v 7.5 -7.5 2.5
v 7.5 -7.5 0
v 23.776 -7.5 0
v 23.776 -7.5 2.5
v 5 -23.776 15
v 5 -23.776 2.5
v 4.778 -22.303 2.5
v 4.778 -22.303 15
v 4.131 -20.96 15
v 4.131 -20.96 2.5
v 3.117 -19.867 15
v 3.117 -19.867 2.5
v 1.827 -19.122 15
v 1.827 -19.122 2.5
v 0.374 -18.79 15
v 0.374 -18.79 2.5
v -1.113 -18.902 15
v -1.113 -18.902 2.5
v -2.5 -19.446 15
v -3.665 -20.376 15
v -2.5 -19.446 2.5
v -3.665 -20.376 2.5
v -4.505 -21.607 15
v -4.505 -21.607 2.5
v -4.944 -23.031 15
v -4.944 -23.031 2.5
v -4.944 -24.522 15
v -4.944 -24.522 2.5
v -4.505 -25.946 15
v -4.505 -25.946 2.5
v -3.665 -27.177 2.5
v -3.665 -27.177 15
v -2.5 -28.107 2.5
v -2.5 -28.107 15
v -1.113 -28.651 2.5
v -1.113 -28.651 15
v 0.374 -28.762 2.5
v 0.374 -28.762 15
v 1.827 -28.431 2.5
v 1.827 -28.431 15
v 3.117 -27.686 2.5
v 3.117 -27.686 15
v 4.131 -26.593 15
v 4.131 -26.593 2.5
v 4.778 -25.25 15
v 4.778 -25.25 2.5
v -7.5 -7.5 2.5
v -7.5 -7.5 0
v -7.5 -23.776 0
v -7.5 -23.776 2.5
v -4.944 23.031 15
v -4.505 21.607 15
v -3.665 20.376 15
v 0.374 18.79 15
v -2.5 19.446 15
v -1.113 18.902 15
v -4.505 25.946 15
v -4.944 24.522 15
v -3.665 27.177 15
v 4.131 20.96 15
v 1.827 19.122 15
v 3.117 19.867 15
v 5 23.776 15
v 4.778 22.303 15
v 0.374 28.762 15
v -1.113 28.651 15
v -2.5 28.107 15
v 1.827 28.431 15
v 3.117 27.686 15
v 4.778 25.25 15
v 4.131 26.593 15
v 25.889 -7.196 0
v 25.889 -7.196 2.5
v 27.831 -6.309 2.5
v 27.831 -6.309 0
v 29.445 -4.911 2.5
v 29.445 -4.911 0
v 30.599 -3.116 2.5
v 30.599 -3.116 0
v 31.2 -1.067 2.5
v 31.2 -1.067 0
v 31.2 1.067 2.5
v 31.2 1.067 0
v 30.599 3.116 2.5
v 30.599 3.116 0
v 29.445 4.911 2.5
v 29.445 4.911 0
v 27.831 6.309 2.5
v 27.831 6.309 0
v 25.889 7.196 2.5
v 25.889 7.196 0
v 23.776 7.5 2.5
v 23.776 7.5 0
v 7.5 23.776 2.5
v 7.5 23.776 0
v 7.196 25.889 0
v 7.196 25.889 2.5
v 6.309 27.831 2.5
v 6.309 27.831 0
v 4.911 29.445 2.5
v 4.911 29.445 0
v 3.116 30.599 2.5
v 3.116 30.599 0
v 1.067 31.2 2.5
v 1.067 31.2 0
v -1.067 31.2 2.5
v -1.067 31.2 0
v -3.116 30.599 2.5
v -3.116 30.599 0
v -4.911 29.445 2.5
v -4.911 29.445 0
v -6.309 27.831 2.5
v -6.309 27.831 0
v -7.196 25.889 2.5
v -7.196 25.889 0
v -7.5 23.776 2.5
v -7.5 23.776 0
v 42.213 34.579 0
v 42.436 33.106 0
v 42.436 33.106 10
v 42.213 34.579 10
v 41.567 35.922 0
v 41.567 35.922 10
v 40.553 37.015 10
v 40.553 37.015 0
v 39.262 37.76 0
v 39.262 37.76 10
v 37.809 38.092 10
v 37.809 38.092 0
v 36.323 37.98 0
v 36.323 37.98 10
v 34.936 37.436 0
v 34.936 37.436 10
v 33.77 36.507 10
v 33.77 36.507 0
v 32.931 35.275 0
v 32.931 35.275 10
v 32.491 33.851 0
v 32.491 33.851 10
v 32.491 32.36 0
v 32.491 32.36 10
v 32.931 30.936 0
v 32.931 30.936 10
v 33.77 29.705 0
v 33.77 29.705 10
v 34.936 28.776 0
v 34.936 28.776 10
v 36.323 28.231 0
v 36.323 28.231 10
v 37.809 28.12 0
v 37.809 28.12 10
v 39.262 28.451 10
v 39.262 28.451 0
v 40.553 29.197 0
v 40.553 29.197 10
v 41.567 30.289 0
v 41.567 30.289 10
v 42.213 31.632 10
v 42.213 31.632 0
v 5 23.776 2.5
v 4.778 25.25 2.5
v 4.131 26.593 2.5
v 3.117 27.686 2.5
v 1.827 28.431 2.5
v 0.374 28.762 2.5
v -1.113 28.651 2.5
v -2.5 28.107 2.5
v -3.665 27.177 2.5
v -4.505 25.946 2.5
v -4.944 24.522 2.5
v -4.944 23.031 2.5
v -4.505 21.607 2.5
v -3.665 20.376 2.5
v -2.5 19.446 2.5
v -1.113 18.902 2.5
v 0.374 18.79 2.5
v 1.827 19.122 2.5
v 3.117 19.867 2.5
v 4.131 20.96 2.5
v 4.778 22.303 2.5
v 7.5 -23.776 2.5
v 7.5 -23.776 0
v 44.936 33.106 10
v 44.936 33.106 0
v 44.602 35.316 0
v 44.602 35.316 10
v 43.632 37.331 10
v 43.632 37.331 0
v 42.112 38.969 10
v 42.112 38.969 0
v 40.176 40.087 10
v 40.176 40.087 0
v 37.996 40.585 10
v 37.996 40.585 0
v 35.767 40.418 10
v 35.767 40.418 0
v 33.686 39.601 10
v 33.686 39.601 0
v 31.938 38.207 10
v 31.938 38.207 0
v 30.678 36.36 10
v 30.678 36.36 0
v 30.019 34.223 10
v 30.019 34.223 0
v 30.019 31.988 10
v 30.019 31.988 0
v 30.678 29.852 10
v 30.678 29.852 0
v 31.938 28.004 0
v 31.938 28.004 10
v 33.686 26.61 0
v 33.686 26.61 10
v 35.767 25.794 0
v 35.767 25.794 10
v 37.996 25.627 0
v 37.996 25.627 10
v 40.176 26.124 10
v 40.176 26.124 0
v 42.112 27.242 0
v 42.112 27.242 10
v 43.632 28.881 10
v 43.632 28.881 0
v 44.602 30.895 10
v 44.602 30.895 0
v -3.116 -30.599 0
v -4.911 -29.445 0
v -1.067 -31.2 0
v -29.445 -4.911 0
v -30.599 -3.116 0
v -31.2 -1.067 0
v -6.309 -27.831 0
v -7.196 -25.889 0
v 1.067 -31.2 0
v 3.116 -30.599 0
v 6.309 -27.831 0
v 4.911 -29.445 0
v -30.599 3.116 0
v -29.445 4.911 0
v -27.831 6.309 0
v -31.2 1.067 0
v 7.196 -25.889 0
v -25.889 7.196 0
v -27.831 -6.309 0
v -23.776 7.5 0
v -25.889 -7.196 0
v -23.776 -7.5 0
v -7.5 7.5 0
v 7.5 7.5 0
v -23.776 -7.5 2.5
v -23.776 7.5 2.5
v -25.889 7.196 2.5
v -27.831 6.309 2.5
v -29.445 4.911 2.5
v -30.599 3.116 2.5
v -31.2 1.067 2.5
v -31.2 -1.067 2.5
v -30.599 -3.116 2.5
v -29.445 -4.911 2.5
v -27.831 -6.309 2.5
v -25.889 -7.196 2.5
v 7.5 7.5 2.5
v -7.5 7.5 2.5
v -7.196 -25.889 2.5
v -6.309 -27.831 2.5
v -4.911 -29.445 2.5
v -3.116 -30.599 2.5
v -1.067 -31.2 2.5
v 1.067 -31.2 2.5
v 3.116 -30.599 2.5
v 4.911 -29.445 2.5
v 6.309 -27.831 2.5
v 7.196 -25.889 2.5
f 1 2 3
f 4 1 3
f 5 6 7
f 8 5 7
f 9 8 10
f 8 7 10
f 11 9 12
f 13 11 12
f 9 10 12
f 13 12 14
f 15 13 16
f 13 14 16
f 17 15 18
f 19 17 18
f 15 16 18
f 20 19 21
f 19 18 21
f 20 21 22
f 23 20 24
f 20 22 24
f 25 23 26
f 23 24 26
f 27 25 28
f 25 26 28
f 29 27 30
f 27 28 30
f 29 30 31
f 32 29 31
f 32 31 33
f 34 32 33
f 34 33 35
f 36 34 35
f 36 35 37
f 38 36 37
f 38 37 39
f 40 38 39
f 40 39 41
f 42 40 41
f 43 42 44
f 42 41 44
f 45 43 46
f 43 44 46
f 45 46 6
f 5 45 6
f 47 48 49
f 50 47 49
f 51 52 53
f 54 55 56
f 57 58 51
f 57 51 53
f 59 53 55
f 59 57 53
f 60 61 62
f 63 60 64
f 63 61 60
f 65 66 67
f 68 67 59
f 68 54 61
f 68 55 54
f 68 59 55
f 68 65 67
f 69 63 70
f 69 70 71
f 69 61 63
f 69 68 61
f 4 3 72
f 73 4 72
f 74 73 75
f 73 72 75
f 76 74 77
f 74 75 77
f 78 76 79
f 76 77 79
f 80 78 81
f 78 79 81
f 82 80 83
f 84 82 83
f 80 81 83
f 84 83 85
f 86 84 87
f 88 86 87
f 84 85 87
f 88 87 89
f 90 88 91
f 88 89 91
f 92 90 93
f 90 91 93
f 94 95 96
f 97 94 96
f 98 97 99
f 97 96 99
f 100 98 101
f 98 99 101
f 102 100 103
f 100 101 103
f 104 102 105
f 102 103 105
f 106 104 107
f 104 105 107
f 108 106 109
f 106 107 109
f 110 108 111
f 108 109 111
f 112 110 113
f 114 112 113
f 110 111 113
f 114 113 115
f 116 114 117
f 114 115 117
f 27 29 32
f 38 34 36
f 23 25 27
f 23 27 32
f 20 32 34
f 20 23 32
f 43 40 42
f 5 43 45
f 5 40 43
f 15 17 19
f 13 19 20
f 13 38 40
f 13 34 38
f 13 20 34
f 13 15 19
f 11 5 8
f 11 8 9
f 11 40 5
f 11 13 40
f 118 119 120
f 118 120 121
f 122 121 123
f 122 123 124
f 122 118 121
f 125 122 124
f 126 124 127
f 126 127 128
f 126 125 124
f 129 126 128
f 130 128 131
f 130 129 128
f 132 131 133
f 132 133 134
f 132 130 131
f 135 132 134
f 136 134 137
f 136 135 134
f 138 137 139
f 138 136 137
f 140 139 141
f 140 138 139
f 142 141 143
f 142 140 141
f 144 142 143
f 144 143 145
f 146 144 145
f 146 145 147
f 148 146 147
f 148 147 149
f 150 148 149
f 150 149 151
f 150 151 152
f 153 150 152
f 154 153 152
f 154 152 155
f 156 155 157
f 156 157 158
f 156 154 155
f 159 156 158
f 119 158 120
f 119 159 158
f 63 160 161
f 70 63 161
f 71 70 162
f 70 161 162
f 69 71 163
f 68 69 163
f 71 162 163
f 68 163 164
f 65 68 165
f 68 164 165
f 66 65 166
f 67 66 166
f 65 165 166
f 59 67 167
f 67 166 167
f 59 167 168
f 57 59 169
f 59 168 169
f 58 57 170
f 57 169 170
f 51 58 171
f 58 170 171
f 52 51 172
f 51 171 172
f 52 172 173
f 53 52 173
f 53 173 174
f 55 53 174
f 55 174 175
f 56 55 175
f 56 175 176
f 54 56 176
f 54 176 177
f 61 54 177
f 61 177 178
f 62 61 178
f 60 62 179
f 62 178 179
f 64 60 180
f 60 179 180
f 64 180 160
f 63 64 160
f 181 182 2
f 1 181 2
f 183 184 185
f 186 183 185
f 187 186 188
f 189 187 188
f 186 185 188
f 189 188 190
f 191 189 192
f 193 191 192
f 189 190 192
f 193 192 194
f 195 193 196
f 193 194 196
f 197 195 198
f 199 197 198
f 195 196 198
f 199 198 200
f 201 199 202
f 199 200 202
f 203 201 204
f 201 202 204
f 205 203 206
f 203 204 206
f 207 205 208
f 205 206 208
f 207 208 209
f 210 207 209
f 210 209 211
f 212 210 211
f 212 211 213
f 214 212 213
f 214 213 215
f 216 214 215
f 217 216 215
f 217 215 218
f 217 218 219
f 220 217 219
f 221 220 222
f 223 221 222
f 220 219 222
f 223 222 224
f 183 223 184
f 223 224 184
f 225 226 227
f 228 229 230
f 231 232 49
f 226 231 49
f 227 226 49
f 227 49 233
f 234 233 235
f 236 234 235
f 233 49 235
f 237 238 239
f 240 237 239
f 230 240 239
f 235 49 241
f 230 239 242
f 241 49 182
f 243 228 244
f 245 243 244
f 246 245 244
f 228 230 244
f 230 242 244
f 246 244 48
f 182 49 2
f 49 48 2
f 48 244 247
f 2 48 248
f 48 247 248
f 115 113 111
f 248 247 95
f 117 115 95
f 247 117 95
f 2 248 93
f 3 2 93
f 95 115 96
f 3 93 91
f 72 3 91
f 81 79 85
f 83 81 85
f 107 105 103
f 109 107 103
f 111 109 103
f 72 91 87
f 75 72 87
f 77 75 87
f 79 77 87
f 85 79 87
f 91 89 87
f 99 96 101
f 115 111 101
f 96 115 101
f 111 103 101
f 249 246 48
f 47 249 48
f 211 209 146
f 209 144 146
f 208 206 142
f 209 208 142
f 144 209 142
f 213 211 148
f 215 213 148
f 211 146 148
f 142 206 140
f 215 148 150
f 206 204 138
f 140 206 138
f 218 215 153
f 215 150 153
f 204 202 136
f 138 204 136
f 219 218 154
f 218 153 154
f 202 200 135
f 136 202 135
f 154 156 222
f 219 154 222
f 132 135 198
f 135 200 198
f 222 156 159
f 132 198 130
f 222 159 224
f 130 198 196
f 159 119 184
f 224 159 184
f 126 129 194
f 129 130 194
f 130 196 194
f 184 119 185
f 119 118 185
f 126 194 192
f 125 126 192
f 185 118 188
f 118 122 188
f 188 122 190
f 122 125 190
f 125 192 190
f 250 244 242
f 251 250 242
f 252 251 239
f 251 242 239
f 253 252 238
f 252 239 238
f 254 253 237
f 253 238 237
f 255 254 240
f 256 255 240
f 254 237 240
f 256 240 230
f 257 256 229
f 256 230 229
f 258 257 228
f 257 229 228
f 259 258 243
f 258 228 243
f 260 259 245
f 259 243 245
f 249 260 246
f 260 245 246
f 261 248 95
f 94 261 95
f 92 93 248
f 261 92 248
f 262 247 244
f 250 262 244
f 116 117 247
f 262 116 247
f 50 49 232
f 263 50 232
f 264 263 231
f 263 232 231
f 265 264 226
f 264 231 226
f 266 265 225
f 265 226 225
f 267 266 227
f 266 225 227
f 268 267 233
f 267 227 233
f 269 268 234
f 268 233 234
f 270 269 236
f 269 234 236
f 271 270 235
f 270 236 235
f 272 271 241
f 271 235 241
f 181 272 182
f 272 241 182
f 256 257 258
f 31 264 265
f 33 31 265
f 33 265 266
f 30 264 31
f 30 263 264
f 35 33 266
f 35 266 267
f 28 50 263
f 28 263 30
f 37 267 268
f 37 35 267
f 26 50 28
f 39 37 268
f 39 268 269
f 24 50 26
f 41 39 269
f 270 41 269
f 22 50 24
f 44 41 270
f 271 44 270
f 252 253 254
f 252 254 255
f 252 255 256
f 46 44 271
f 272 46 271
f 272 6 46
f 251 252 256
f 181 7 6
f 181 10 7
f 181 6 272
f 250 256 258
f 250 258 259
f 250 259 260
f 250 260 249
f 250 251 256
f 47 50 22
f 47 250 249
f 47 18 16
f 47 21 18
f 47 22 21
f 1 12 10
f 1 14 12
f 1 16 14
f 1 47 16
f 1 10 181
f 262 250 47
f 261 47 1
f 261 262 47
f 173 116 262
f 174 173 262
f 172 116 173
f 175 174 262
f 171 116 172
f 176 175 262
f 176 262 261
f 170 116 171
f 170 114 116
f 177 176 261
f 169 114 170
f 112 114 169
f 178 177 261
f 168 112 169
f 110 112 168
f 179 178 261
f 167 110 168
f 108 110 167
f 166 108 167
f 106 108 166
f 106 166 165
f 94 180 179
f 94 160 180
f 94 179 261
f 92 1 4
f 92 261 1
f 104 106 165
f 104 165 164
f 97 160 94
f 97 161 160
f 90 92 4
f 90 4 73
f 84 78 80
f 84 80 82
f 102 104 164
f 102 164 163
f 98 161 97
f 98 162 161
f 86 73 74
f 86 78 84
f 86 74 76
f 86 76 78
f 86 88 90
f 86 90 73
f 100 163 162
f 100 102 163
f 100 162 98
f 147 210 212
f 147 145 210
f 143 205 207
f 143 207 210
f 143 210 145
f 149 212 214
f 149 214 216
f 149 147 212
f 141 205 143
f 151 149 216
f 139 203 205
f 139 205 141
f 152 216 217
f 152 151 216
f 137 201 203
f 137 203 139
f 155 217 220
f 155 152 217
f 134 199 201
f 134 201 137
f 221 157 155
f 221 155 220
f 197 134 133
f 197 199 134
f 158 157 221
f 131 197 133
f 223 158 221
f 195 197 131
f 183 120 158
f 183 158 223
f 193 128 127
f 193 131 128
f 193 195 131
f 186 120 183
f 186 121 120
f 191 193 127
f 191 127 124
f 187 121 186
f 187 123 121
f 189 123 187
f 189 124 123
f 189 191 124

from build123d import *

# Parameters (mm, degrees)
F0_W     = 7.5
F0_H     = 15
F1_DEPTH = 2.5
F2_R     = 5
F3_DEPTH = 12.5
F4_R     = 7.5
F4_R_2   = 5
F5_DEPTH = 10


# Not quite as in the source:
# - a feature names something its author has since deleted; it is built from what else it names


with BuildPart() as f1:
    # F0 (on Top) → F1 (new body)
    with BuildSketch(Plane.XY):
        with BuildLine():
            Line((0, -16.2764129074), (0, -7.5))
            Line((0, -7.5), (-7.5, -7.5))
            Line((-7.5, -7.5), (-7.5, -23.7764129074))
            ThreePointArc((-7.5, -23.7764129074), (-5.3033008589, -18.4731120485), (0, -16.2764129074))
        make_face()
        with Locations((-3.75, 0)):
            Rectangle(F0_W, F0_H)
        with BuildLine():
            Line((0, 7.5), (0, 16.2764129074))
            ThreePointArc((0, 16.2764129074), (-5.3033008589, 18.4731120485), (-7.5, 23.7764129074))
            Line((-7.5, 23.7764129074), (-7.5, 7.5))
            Line((-7.5, 7.5), (0, 7.5))
        make_face()
        with BuildLine():
            ThreePointArc((2.3176274578, 16.6434890352), (1.1732584878, 16.3687503529), (0, 16.2764129074))
            Line((0, 16.2764129074), (0, 7.5))
            Line((0, 7.5), (5.2885271376, 7.5))
            Line((5.2885271376, 7.5), (2.3176274578, 16.6434890352))
        make_face()
        with BuildLine():
            Line((7.5, -7.5), (5.2885271376, -7.5))
            Line((5.2885271376, -7.5), (2.3176274578, -16.6434890352))
            ThreePointArc((2.3176274578, -16.6434890352), (6.0676274578, -19.3680235152), (7.5, -23.7764129074))
            Line((7.5, -23.7764129074), (7.5, -7.5))
        make_face()
        with BuildLine():
            Line((0, -23.7764129074), (0, -16.2764129074))
            ThreePointArc((0, -16.2764129074), (-5.3033008589, -18.4731120485), (-7.5, -23.7764129074))
            ThreePointArc((-7.5, -23.7764129074), (0, -31.2764129074), (7.5, -23.7764129074))
            ThreePointArc((7.5, -23.7764129074), (6.0676274578, -19.3680235152), (2.3176274578, -16.6434890352))
            Line((2.3176274578, -16.6434890352), (0, -23.7764129074))
        make_face()
        with BuildLine():
            ThreePointArc((2.3176274578, -16.6434890352), (1.1732584878, -16.3687503529), (0, -16.2764129074))
            Line((0, -16.2764129074), (0, -23.7764129074))
            Line((0, -23.7764129074), (2.3176274578, -16.6434890352))
        make_face()
        with BuildLine():
            ThreePointArc((7.5, 23.7764129074), (6.0676274578, 19.3680235152), (2.3176274578, 16.6434890352))
            Line((2.3176274578, 16.6434890352), (5.2885271376, 7.5))
            Line((5.2885271376, 7.5), (7.5, 7.5))
            Line((7.5, 7.5), (7.5, 23.7764129074))
        make_face()
        with BuildLine():
            Line((0, 16.2764129074), (0, 23.7764129074))
            Line((0, 23.7764129074), (2.3176274578, 16.6434890352))
            ThreePointArc((2.3176274578, 16.6434890352), (6.0676274578, 19.3680235152), (7.5, 23.7764129074))
            ThreePointArc((7.5, 23.7764129074), (0, 31.2764129074), (-7.5, 23.7764129074))
            ThreePointArc((-7.5, 23.7764129074), (-5.3033008589, 18.4731120485), (0, 16.2764129074))
        make_face()
        with BuildLine():
            Line((2.3176274578, 16.6434890352), (0, 23.7764129074))
            Line((0, 23.7764129074), (0, 16.2764129074))
            ThreePointArc((0, 16.2764129074), (1.1732584878, 16.3687503529), (2.3176274578, 16.6434890352))
        make_face()
        with BuildLine():
            Line((5.2885271376, -7.5), (0, -7.5))
            Line((0, -7.5), (0, -16.2764129074))
            ThreePointArc((0, -16.2764129074), (1.1732584878, -16.3687503529), (2.3176274578, -16.6434890352))
            Line((2.3176274578, -16.6434890352), (5.2885271376, -7.5))
        make_face()
        Polygon((7.5, -0.6937863786), (5.2885271376, -7.5), (7.5, -7.5), align=None)
        Polygon((7.5, 7.5), (5.2885271376, 7.5), (7.5, 0.6937863786), align=None)
        with BuildLine():
            Line((23.7764129074, 7.5), (7.5, 7.5))
            Line((7.5, 7.5), (7.5, 0.6937863786))
            Line((7.5, 0.6937863786), (7.7254248594, 0))
            Line((7.7254248594, 0), (7.5, -0.6937863786))
            Line((7.5, -0.6937863786), (7.5, -7.5))
            Line((7.5, -7.5), (23.7764129074, -7.5))
            ThreePointArc((23.7764129074, -7.5), (16.2764129074, 0), (23.7764129074, 7.5))
        make_face()
        Polygon((5.2885271376, 7.5), (0, 7.5), (0, -7.5), (5.2885271376, -7.5), (7.5, -0.6937863786), (7.5, 0.6937863786), align=None)
        Polygon((7.7254248594, 0), (7.5, 0.6937863786), (7.5, -0.6937863786), align=None)
        with BuildLine():
            ThreePointArc((31.2764129074, 0), (29.0797137663, 5.3033008589), (23.7764129074, 7.5))
            ThreePointArc((23.7764129074, 7.5), (16.2764129074, 0), (23.7764129074, -7.5))
            ThreePointArc((23.7764129074, -7.5), (29.0797137663, -5.3033008589), (31.2764129074, 0))
        make_face()
        with BuildLine():
            Line((-7.5, -7.5), (-7.5, 7.5))
            Line((-7.5, 7.5), (-23.7764129074, 7.5))
            ThreePointArc((-23.7764129074, 7.5), (-18.4731120485, 5.3033008589), (-16.2764129074, 0))
            ThreePointArc((-16.2764129074, 0), (-18.4731120485, -5.3033008589), (-23.7764129074, -7.5))
            Line((-23.7764129074, -7.5), (-7.5, -7.5))
        make_face()
        with BuildLine():
            ThreePointArc((-16.2764129074, 0), (-18.4731120485, 5.3033008589), (-23.7764129074, 7.5))
            ThreePointArc((-23.7764129074, 7.5), (-31.2764129074, 0), (-23.7764129074, -7.5))
            ThreePointArc((-23.7764129074, -7.5), (-18.4731120485, -5.3033008589), (-16.2764129074, 0))
        make_face()
    extrude(amount=F1_DEPTH)

    # F2 (on face) → F3 (join)
    with BuildSketch(Plane.XY.offset(2.5)):
        with Locations((0, 23.7764129074)):
            Circle(F2_R)
        with Locations((0, -23.7764129074)):
            Circle(F2_R)
    extrude(amount=F3_DEPTH)


with BuildPart() as f5:
    # F4 (on Top) → F5 (new body)
    with BuildSketch(Plane.XY):
        with Locations((37.4355688691, 33.1056714058)):
            Circle(F4_R)
        with Locations((37.4355688691, 33.1056714058)):
            Circle(F4_R_2, mode=Mode.SUBTRACT)
    extrude(amount=F5_DEPTH)


solid = Compound([f1.part, f5.part])
